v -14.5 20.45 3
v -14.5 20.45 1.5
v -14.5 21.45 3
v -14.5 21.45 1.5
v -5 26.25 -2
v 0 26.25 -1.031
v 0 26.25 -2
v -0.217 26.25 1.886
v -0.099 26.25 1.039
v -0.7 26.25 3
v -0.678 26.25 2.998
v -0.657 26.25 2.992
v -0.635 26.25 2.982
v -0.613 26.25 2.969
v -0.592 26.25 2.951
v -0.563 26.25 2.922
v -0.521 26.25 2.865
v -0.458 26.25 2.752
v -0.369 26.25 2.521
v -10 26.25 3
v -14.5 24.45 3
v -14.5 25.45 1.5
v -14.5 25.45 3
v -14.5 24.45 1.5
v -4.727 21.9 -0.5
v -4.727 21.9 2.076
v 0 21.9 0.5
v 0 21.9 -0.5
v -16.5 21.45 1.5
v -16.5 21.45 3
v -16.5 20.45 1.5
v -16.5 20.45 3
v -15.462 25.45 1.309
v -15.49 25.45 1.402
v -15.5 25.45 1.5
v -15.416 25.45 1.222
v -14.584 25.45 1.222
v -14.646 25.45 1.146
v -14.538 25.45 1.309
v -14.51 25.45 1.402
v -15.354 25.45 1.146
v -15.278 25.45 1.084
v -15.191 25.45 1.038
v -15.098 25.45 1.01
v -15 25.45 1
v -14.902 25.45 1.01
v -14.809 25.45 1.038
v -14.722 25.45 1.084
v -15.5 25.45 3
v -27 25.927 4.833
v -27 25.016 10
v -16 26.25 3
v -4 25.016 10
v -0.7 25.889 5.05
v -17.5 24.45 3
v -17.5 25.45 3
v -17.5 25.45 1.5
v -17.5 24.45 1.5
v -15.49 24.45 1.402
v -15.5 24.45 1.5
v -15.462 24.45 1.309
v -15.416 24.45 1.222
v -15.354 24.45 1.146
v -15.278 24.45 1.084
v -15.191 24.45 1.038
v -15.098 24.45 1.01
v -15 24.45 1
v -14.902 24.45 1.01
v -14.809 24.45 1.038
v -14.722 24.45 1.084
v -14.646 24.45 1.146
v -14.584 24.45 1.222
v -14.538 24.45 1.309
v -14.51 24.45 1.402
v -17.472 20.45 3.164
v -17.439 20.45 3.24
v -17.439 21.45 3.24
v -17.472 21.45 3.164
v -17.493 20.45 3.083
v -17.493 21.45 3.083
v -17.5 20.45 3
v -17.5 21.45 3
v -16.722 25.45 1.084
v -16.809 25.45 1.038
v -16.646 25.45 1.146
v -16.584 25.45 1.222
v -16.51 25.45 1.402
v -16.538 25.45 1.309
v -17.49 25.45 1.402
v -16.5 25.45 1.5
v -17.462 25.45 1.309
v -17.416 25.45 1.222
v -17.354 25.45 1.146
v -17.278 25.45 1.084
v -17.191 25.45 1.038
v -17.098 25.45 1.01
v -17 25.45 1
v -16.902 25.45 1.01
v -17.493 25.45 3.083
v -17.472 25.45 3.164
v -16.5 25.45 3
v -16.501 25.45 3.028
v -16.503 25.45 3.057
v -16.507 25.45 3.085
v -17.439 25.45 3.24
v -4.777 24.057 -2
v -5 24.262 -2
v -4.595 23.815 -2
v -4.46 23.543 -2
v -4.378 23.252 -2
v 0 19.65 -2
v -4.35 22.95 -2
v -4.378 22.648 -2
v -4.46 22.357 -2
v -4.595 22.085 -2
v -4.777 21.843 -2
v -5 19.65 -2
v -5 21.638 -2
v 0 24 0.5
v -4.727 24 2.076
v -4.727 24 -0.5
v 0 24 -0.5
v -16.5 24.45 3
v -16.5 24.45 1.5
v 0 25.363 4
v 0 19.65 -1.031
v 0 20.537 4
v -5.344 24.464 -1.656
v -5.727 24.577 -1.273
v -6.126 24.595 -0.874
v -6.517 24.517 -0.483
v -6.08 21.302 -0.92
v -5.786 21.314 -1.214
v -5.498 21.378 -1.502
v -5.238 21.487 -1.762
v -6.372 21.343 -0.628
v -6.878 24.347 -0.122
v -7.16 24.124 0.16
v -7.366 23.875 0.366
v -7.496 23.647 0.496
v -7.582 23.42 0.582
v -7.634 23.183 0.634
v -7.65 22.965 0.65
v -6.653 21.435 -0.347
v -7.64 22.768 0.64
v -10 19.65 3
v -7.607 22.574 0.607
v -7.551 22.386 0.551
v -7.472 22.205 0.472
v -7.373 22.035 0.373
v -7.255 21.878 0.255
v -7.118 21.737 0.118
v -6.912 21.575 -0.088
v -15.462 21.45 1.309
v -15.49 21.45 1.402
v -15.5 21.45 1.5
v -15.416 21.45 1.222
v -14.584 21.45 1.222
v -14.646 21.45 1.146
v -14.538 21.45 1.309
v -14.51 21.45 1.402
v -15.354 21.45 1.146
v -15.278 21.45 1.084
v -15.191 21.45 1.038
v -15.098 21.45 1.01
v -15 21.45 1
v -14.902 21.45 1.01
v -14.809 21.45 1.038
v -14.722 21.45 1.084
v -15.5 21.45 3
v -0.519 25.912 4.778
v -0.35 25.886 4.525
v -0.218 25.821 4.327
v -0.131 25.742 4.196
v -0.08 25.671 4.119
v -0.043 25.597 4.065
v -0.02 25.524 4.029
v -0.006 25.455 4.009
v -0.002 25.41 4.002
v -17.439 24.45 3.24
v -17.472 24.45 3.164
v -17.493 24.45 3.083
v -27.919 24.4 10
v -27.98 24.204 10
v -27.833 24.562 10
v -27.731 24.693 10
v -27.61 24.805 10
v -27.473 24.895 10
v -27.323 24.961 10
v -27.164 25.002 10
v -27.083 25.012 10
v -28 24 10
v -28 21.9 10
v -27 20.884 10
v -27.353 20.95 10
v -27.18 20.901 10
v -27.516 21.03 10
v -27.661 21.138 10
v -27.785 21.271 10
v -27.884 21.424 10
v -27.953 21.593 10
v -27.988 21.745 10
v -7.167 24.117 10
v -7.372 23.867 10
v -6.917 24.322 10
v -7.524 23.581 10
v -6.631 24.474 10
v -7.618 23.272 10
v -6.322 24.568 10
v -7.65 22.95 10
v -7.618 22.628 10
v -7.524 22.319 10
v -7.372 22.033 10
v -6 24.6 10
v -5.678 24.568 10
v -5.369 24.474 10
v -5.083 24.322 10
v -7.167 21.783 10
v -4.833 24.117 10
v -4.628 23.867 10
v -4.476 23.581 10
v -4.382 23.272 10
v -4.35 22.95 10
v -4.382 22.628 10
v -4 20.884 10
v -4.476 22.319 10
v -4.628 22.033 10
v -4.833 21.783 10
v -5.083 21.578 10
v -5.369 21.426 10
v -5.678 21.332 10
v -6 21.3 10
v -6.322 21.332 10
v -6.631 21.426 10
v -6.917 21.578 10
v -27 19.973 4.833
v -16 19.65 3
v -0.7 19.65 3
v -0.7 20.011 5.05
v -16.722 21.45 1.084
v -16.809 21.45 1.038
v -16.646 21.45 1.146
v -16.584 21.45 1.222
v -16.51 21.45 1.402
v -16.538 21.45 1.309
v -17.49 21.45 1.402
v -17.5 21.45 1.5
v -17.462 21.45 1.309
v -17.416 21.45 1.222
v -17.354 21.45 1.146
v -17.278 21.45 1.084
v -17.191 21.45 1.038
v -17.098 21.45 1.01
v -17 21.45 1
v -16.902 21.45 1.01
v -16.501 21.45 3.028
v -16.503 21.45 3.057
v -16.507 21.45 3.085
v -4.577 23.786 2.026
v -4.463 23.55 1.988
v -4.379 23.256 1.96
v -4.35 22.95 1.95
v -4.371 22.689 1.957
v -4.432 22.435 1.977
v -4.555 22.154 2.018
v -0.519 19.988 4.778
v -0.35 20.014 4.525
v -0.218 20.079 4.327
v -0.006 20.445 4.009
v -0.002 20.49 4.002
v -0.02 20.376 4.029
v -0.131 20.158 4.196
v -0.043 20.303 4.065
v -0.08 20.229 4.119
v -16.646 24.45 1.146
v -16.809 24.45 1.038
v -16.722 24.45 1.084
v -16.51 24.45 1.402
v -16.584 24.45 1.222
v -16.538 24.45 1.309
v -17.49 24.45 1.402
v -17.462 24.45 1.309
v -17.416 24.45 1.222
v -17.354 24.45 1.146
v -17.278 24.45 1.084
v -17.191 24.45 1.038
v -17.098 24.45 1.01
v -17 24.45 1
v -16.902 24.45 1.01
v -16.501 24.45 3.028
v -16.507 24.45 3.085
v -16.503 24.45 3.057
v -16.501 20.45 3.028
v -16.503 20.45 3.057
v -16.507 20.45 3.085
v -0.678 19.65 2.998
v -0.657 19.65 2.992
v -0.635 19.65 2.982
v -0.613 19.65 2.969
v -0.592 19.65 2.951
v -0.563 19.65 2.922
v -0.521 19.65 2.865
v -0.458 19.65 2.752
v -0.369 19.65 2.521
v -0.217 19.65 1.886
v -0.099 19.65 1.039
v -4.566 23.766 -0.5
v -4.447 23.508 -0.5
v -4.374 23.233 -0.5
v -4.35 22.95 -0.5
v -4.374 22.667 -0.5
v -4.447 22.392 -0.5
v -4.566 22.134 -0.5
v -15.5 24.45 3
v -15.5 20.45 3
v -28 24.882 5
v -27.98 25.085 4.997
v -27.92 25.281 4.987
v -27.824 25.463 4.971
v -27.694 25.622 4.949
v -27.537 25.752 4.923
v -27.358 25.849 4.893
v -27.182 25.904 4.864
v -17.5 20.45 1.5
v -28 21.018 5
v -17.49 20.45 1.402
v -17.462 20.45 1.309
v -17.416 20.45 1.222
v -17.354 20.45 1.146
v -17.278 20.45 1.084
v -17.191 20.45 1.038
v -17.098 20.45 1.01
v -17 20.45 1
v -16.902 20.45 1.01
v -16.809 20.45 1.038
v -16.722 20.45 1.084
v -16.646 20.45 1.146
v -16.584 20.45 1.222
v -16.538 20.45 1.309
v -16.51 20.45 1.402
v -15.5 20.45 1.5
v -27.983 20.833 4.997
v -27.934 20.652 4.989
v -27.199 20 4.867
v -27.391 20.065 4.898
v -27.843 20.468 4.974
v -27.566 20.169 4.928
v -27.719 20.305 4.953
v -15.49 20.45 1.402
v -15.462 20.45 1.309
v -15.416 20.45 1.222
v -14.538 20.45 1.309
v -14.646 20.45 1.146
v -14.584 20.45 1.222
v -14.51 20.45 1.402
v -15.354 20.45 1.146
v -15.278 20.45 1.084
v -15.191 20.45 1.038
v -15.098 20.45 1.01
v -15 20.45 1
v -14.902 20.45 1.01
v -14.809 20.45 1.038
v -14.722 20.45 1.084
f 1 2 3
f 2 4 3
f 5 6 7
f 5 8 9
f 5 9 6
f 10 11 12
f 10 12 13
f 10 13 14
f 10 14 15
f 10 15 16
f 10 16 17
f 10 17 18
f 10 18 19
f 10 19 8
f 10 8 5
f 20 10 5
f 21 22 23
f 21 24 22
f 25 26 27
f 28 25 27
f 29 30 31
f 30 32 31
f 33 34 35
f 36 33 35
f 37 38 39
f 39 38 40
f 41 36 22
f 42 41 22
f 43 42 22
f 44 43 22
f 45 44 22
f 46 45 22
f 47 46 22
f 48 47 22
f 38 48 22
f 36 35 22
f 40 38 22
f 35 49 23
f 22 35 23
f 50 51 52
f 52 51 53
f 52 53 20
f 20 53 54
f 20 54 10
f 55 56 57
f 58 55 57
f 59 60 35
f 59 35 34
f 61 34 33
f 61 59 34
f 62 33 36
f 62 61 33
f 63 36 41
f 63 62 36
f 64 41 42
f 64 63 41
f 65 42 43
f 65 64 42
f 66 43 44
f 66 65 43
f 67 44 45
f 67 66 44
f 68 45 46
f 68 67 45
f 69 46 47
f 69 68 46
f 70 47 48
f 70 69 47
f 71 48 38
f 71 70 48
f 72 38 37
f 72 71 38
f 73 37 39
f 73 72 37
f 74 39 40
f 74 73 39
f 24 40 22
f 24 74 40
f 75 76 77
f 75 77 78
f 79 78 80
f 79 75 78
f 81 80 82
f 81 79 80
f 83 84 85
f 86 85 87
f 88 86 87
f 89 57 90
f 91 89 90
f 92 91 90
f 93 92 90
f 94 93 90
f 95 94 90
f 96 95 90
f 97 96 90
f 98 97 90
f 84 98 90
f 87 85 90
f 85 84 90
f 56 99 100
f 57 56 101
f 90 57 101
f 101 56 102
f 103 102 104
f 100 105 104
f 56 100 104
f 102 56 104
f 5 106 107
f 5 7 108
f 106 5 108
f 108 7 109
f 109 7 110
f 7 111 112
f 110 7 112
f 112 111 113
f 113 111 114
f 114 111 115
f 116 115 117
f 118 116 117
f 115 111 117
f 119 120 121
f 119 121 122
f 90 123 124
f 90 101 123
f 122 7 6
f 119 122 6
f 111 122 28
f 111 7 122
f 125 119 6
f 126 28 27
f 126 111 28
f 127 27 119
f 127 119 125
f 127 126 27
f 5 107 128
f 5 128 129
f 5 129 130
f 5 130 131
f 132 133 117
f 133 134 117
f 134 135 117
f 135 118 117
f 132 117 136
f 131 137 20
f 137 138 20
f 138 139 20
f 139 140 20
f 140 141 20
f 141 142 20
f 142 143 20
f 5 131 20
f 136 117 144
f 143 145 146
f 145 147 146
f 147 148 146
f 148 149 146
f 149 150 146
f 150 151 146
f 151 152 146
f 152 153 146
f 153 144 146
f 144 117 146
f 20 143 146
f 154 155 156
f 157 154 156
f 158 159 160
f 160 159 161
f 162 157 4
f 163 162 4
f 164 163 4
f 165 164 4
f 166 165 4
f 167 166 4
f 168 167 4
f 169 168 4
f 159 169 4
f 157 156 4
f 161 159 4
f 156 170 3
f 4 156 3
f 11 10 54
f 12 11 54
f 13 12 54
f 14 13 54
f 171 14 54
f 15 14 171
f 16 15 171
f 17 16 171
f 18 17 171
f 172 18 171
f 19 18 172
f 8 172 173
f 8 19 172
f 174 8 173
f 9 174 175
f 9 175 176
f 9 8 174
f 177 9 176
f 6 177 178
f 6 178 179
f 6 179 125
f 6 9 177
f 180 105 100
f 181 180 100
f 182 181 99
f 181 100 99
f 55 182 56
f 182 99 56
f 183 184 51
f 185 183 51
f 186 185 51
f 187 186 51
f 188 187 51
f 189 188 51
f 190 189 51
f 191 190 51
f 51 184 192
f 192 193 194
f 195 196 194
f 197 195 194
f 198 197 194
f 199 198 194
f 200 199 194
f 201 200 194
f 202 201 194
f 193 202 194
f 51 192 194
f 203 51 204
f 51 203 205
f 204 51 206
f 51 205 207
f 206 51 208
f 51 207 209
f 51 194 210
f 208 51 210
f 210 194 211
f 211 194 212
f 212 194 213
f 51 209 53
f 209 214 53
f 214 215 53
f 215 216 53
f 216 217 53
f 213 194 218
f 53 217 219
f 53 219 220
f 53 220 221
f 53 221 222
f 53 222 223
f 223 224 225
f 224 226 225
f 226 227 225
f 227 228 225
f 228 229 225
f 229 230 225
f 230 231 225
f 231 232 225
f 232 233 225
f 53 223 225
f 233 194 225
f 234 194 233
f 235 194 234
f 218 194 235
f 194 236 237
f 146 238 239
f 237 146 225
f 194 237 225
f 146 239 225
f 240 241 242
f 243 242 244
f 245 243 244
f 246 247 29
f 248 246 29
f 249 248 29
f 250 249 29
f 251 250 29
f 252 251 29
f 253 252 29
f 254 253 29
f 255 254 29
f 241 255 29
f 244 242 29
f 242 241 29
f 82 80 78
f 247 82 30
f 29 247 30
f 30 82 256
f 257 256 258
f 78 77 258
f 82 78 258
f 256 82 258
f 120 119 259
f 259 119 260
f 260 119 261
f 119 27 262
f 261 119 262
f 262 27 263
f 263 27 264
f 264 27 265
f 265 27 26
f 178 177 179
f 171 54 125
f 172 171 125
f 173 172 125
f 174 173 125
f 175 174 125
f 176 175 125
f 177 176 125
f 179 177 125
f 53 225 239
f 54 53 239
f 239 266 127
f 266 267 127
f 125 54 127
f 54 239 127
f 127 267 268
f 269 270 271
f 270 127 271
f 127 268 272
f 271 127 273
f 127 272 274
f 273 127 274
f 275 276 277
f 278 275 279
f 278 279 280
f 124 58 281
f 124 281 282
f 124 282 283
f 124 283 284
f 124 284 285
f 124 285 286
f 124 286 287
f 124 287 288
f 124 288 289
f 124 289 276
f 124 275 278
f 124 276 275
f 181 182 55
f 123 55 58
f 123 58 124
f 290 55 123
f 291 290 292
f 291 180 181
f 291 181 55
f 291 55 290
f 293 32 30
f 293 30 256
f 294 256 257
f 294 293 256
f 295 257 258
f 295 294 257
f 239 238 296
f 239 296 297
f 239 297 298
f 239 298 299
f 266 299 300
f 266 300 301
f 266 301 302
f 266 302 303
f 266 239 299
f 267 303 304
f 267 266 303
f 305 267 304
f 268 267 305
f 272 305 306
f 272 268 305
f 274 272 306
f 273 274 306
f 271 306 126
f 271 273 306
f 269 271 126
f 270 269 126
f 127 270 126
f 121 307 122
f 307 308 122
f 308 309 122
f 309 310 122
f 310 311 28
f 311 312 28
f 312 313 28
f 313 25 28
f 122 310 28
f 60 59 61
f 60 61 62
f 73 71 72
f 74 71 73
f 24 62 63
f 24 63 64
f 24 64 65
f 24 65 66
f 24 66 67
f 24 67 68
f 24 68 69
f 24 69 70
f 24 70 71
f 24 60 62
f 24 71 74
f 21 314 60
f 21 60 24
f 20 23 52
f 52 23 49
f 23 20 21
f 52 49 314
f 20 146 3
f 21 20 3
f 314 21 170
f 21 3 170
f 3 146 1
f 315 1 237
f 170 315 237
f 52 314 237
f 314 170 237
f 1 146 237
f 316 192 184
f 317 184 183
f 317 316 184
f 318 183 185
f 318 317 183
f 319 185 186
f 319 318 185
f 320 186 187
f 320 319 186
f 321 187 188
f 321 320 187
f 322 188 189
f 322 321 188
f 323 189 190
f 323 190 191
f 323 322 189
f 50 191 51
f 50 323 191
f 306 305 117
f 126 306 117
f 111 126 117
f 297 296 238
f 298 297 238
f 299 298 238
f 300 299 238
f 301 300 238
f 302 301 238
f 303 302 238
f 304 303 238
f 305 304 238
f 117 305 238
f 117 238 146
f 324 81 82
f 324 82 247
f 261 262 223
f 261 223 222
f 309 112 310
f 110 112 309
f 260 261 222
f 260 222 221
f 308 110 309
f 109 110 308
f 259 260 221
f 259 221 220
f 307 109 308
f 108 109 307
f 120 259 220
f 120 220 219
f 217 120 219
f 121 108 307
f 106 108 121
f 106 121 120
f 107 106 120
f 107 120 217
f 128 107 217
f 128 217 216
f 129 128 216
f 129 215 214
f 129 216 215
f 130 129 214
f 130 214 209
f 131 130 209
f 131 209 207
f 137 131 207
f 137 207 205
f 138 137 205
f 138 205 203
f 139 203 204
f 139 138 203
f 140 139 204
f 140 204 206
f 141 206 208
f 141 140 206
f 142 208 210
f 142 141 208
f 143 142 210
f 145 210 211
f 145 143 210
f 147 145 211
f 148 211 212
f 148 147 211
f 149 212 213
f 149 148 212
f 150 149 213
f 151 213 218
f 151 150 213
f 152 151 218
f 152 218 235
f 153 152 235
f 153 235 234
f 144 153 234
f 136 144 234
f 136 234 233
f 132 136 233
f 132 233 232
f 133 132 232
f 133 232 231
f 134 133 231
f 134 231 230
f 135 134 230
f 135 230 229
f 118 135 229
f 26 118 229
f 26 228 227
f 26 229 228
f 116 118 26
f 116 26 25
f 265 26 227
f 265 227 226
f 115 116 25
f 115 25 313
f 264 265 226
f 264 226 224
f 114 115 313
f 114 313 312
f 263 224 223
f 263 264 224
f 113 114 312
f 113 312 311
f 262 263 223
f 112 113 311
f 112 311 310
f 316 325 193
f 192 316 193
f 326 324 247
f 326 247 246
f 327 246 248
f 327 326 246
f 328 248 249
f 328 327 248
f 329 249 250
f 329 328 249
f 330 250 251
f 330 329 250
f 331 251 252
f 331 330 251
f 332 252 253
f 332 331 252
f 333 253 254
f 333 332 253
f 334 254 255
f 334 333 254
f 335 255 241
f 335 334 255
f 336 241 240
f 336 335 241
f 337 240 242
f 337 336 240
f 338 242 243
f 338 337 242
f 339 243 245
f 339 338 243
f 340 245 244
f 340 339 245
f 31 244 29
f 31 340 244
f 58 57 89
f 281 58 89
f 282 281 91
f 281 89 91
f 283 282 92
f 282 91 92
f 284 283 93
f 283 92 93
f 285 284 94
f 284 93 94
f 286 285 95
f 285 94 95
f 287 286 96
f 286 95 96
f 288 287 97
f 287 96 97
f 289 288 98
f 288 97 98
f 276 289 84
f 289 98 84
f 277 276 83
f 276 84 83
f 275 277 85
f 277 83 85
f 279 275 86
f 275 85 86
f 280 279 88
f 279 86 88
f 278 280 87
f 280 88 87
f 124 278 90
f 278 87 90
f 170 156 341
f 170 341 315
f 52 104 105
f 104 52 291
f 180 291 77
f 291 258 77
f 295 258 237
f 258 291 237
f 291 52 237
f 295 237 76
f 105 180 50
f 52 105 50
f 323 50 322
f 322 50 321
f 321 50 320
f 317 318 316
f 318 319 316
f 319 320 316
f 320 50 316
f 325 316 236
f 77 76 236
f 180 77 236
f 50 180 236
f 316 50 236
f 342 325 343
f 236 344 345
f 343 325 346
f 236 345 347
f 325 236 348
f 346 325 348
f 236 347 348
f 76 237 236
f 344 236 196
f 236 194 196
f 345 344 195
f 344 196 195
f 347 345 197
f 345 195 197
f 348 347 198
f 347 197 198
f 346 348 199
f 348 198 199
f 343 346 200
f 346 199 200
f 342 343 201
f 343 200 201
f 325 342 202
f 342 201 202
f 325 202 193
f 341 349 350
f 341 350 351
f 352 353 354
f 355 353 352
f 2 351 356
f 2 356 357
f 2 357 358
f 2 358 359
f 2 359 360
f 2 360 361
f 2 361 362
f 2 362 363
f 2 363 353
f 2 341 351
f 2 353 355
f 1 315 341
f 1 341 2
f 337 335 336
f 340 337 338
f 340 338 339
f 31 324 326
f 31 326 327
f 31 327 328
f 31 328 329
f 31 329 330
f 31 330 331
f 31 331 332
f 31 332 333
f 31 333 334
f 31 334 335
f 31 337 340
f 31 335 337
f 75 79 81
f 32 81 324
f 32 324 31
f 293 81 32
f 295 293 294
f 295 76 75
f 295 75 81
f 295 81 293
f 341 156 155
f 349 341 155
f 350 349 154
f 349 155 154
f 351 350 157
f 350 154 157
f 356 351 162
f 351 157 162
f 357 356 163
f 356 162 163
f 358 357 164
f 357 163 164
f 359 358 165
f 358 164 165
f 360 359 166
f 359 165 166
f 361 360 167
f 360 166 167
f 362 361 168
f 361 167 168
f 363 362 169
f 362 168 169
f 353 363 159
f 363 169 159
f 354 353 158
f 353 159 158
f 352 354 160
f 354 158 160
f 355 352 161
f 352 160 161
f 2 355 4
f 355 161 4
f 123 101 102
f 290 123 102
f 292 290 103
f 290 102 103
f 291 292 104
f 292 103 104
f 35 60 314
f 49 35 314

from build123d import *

# Parameters (mm, degrees)
CYLINDER_R      = 1.65
CYLINDER_DEPTH  = 30
PAD005_DEPTH    = 1.05
PAD001_DEPTH    = 3.3
POCKET004_DEPTH = 28.001
PAD002_DEPTH    = 0.5
FILLET_R        = 0.7
FILLET002_R     = 1


with BuildPart() as black_led_base:
    # Cylinder → Cylinder (join)
    with BuildSketch(Plane(origin=(-6, 0, -15), x_dir=(1, 0, 0), z_dir=(0, 0, 1))):
        Circle(CYLINDER_R)
    extrude(amount=CYLINDER_DEPTH)


with BuildPart() as black_iface_base:
    # Sketch016 → Pad005 (new body, symmetric)
    with BuildSketch(Plane.XZ):
        Polygon((-6, 2.5), (-6, -0.5), (0, -0.5), (0, 0.5), align=None)
    extrude(amount=PAD005_DEPTH, both=True)


with BuildPart() as black_d:
    # Sketch005 → Pad001 (new body, symmetric)
    with BuildSketch(Plane.XZ):
        Polygon((0, 0), (0, -2), (-5, -2), (-10, 3), (-16, 3), (-28, 5), (-28, 10), (-4, 10), (0, 4), align=None)
    extrude(amount=PAD001_DEPTH, both=True)

    # Sketch006 → Pocket004 (cut, through all)
    with BuildSketch(Plane.YZ):
        Polygon((-3.3, 0), (-3.3, 3), (0, 21.71523), (3.3, 3), (3.3, 0), (13, 0), (13, 26), (-13, 26), (-13, 0), align=None)
    extrude(amount=-POCKET004_DEPTH, mode=Mode.SUBTRACT)

    # Sketch008 → Pad002 (join, symmetric)
    with BuildSketch(Plane.XZ.offset(2)):
        with BuildLine():
            ThreePointArc((-15.5, 1.5), (-15, 1), (-14.5, 1.5))
            Line((-14.5, 1.5), (-14.5, 3))
            ThreePointArc((-14.5, 3), (-15, 3.5), (-15.5, 3))
            Line((-15.5, 1.5), (-15.5, 3))
        make_face()
        with BuildLine():
            ThreePointArc((-16.5, 3), (-17, 3.5), (-17.5, 3))
            Line((-17.5, 3), (-17.5, 1.5))
            ThreePointArc((-17.5, 1.5), (-17, 1), (-16.5, 1.5))
            Line((-16.5, 3), (-16.5, 1.5))
        make_face()
    pad002 = extrude(amount=PAD002_DEPTH, both=True)

    # Mirrored001: Pad002 across XZ
    add(pad002.mirror(Plane.XZ))

    # Fillet
    fillet_edges = [black_d.edges().sort_by_distance(p)[0] for p in [
        (0, -3.211837, 3.5),
        (0, 3.211837, 3.5),
    ]]
    fillet(fillet_edges, radius=FILLET_R)

    # Fillet002
    fillet002_edges = [black_d.edges().sort_by_distance(p)[0] for p in [
        (-28, -2.506529, 7.5),
        (-28, 2.506529, 7.5),
    ]]
    fillet(fillet002_edges, radius=FILLET002_R)

    # Boolean001: cut black_led_BASE, black_iface_BASE
    add(black_led_base.part, mode=Mode.SUBTRACT)
    add(black_iface_base.part, mode=Mode.SUBTRACT)


with BuildPart() as black_d_1:
    # Clone009 placement: moved
    add(black_d.part.moved(Location((0, 22.95, 0))))


solid = black_d_1.part
